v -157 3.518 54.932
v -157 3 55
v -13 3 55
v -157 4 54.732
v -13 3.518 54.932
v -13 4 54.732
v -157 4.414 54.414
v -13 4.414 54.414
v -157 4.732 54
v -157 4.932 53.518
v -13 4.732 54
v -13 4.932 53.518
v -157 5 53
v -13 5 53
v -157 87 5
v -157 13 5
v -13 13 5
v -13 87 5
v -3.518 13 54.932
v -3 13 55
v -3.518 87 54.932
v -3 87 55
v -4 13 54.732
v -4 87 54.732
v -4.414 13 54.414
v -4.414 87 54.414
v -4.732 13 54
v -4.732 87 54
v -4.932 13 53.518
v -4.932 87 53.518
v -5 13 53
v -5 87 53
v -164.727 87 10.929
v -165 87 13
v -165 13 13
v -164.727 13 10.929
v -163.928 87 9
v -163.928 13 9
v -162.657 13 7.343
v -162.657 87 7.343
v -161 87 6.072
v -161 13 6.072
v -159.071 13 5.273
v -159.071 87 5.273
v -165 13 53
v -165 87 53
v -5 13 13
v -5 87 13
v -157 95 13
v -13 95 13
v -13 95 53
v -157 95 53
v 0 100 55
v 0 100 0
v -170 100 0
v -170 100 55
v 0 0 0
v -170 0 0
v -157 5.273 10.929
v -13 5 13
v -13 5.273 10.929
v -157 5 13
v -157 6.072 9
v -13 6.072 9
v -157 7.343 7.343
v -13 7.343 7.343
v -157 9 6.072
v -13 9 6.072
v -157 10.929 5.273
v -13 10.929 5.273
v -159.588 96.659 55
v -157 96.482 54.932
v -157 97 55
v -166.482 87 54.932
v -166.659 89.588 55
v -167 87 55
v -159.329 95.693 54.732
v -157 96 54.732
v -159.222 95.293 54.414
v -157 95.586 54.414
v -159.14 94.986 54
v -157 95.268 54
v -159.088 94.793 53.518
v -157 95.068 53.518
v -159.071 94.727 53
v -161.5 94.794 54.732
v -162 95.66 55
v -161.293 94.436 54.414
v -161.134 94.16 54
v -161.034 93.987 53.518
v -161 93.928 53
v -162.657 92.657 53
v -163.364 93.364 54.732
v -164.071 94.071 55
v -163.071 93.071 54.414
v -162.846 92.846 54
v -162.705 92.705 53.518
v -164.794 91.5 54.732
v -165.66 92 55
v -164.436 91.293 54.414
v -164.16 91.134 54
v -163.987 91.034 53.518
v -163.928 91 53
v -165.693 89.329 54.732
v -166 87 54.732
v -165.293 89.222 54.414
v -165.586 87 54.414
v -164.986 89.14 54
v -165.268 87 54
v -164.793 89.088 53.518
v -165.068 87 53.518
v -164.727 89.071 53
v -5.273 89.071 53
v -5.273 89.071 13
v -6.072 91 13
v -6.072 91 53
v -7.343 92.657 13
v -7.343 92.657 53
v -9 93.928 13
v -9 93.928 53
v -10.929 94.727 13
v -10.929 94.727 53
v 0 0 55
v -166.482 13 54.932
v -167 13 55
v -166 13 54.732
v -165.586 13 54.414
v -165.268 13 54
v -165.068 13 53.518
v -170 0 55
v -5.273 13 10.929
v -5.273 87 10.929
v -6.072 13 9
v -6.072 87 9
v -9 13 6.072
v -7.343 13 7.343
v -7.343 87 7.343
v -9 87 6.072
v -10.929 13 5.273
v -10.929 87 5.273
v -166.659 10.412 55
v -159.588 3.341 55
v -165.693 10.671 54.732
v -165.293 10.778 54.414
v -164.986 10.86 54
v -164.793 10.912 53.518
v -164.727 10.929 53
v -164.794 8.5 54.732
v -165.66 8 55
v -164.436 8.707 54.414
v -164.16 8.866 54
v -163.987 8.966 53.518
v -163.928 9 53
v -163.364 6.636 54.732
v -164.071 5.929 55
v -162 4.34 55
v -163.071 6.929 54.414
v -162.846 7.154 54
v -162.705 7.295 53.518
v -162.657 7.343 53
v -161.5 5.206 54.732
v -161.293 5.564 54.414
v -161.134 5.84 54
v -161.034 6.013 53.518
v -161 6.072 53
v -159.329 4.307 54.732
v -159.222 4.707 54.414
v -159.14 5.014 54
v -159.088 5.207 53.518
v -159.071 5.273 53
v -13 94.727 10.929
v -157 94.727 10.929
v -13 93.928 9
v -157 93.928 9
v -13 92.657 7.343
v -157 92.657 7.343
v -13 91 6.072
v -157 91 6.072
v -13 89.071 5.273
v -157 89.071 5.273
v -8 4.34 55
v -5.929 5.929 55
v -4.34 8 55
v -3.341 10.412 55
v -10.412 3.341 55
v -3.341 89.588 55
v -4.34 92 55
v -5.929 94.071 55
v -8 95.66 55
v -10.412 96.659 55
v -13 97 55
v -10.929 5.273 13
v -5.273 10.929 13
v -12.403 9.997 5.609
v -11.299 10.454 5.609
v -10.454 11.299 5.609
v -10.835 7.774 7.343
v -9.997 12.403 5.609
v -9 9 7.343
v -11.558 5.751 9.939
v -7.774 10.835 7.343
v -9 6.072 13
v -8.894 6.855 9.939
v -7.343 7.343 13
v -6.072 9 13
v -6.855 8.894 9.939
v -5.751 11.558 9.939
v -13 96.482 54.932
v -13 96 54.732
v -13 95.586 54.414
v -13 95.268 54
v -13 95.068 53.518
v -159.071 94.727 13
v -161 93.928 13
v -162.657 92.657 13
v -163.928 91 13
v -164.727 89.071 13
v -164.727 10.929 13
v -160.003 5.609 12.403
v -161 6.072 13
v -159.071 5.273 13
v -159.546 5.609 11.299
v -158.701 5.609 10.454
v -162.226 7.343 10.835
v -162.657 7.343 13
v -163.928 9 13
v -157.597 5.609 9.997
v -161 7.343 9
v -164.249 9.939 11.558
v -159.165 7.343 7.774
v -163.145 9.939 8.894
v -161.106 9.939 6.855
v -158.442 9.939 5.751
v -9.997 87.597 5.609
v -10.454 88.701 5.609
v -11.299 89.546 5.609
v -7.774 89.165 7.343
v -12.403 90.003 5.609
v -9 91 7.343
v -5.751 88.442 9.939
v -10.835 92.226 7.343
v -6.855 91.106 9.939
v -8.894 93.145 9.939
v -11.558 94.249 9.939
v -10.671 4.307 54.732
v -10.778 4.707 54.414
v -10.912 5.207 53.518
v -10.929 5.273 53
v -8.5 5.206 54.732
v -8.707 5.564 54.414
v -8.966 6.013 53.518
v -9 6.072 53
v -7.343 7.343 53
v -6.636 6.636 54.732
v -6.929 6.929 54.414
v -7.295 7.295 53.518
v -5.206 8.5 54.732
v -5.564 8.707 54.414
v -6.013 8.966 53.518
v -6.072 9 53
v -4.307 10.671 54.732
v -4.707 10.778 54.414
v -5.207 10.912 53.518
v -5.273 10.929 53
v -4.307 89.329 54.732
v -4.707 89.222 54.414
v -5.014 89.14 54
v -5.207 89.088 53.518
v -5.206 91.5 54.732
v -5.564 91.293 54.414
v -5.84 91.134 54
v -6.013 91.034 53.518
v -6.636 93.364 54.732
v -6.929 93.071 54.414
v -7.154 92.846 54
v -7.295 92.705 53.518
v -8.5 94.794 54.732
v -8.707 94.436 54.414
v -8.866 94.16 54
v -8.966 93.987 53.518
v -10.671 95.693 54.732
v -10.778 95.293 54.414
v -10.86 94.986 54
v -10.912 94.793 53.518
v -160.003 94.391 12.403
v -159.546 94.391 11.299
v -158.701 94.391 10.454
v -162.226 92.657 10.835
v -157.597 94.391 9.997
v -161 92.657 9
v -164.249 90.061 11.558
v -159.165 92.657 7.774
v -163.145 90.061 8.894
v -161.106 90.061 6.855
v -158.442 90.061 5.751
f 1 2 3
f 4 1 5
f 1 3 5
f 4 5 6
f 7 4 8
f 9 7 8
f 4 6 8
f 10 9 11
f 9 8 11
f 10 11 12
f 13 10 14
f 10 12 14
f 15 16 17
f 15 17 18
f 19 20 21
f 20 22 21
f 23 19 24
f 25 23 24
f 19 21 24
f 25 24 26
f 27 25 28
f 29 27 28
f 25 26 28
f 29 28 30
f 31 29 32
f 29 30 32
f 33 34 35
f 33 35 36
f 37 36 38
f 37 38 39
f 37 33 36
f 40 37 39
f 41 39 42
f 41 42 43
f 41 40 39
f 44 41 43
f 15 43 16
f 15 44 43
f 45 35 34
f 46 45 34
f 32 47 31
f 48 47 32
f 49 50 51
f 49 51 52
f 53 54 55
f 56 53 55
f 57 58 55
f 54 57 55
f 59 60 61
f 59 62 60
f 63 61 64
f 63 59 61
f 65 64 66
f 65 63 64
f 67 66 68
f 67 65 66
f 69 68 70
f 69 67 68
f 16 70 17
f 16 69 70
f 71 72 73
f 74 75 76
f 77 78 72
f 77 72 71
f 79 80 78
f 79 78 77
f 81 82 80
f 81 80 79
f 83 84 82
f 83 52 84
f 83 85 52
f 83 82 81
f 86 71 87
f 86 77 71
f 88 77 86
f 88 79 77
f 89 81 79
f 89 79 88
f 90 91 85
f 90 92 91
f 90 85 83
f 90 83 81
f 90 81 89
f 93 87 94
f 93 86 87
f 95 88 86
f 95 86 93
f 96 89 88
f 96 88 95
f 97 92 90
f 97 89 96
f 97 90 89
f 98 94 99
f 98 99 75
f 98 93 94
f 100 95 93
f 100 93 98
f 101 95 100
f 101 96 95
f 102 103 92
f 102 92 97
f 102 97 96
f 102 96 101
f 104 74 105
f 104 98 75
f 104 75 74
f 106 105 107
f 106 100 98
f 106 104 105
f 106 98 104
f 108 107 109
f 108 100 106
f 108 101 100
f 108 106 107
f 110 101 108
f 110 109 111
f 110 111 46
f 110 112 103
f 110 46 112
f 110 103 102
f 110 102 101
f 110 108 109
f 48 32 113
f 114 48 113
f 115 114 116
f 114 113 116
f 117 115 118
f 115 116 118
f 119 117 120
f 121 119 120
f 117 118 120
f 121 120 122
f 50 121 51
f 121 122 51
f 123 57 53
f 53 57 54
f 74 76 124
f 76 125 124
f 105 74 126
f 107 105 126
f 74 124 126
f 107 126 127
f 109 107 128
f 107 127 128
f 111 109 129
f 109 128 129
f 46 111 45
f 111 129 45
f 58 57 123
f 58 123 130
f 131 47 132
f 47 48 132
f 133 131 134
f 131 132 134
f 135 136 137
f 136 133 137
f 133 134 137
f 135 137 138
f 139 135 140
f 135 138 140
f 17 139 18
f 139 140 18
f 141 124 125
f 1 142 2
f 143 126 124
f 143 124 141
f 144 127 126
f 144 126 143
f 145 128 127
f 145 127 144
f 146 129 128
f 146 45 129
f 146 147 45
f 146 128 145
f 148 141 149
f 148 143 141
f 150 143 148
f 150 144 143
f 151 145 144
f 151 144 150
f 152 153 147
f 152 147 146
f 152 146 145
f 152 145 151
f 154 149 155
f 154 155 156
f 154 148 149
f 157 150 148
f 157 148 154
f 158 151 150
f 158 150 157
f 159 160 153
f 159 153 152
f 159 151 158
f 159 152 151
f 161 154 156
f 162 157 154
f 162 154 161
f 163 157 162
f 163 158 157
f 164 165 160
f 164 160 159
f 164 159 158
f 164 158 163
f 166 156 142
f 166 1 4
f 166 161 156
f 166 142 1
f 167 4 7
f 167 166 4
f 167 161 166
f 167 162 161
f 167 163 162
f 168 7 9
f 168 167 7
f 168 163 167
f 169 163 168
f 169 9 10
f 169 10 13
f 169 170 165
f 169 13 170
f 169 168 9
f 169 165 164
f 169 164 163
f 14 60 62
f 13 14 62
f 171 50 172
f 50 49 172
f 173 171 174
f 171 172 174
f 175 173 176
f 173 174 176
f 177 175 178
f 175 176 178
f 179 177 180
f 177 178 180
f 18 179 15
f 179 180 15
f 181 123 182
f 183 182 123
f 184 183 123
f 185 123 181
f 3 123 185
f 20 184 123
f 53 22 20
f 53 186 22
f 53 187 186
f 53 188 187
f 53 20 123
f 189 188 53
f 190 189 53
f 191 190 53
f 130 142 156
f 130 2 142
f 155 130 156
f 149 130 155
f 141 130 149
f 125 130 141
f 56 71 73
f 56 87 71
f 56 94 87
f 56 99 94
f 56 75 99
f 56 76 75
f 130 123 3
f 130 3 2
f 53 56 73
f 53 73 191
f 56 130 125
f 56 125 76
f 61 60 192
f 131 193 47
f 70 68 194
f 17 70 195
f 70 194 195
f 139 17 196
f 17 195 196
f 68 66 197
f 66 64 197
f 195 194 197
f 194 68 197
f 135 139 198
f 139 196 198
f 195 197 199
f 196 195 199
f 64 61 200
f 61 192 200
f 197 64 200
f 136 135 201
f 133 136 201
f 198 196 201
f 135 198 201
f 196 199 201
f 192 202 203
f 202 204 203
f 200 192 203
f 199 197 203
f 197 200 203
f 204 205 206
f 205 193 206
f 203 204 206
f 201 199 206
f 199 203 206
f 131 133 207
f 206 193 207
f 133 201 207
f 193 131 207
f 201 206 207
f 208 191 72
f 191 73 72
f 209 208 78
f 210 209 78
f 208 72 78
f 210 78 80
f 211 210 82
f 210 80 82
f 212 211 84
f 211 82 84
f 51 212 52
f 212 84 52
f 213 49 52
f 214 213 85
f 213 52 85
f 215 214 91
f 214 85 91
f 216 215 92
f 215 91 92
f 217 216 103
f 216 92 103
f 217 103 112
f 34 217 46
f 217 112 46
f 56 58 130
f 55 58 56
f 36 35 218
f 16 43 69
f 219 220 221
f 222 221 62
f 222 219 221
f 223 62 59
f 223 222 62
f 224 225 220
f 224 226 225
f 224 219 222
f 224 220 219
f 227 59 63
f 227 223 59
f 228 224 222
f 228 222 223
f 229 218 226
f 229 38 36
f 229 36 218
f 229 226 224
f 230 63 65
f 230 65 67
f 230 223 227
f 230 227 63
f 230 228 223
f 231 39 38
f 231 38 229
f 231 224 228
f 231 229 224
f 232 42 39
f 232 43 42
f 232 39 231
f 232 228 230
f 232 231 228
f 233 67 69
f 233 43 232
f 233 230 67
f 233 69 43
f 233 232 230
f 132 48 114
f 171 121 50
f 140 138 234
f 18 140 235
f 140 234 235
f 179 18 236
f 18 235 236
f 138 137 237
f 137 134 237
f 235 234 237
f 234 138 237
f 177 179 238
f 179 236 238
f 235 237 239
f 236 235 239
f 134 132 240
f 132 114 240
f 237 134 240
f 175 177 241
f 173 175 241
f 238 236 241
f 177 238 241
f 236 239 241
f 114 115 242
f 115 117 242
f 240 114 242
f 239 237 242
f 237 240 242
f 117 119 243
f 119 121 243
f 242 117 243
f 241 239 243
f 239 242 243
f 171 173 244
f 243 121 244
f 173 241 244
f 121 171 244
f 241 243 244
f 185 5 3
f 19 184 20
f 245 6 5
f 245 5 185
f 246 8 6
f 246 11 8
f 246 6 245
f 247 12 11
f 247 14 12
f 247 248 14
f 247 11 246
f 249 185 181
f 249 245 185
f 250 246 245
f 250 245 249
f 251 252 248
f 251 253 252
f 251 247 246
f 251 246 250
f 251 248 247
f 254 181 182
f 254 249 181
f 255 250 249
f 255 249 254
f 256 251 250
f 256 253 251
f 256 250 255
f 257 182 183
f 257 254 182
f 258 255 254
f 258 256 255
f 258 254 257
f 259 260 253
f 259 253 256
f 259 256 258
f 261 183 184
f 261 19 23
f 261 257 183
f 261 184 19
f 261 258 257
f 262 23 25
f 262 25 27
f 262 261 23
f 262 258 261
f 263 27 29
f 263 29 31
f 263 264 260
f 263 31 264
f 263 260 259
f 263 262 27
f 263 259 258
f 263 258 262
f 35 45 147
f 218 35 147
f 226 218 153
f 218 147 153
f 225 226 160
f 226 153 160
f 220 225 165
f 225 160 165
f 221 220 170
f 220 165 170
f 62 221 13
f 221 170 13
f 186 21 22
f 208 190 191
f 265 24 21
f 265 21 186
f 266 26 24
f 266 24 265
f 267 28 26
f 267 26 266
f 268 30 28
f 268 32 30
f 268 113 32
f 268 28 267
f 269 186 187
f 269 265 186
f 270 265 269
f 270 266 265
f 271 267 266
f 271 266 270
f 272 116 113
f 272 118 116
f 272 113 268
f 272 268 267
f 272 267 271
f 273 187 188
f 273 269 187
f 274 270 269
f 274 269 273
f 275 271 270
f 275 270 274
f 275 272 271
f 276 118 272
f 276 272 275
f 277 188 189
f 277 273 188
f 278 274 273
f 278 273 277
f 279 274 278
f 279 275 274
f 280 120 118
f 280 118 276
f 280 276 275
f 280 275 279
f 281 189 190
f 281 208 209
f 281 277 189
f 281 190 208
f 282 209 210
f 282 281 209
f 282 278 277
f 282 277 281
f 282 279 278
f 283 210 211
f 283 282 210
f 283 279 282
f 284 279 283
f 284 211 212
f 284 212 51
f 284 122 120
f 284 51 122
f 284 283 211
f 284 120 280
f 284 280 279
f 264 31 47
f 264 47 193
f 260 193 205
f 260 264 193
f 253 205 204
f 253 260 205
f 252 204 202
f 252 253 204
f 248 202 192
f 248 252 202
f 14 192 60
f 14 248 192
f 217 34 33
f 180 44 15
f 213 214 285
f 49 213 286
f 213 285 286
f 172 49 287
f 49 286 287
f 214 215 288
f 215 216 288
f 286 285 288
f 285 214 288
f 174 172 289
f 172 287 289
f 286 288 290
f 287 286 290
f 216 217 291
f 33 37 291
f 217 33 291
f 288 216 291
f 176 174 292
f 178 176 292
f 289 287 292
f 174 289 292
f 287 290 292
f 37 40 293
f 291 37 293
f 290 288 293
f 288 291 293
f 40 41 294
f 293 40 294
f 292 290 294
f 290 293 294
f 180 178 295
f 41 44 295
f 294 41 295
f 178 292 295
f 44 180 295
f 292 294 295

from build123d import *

# Parameters (mm, degrees)
IZIM1_W                     = 90
IZIM1_H                     = 160
Y_KSEKLIK_EKSTR_ZYON1_DEPTH = 5
IZIM1_3_W                   = 100
IZIM1_3_H                   = 170
IZIM1_3_W_2                 = 90
IZIM1_3_H_2                 = 160
Y_KSEKLIK_EKSTR_ZYON2_DEPTH = 55
RADYUS1_R                   = 8
RADYUS2_R                   = 2


with BuildPart() as part:
    # Çizim1 → Yükseklik-Ekstrüzyon1 (new body)
    with BuildSketch(Plane(origin=(0, 0, 0), x_dir=(0, 1, 0), z_dir=(0, 0, 1))):
        with Locations((50, 85)):
            Rectangle(IZIM1_W, IZIM1_H)
    extrude(amount=Y_KSEKLIK_EKSTR_ZYON1_DEPTH)

    # Çizim1<3> → Yükseklik-Ekstrüzyon2 (add)
    with BuildSketch(Plane(origin=(0, 0, 0), x_dir=(0, 1, 0), z_dir=(0, 0, 1))):
        with Locations((50, 85)):
            Rectangle(IZIM1_3_W, IZIM1_3_H)
        with Locations((50, 85)):
            Rectangle(IZIM1_3_W_2, IZIM1_3_H_2, mode=Mode.SUBTRACT)
    extrude(amount=Y_KSEKLIK_EKSTR_ZYON2_DEPTH)

    # Radyus1
    radyus1_edges = [part.edges().sort_by_distance(p)[0] for p in [
        (-165, 50, 5),
        (-5, 95, 30),
        (-165, 95, 30),
        (-165, 5, 30),
        (-5, 5, 30),
        (-85, 5, 5),
        (-5, 50, 5),
        (-85, 95, 5),
    ]]
    fillet(radyus1_edges, radius=RADYUS1_R)

    # Radyus2
    radyus2_edges = [part.edges().sort_by_distance(p)[0] for p in [
        (-5, 50, 55),
        (-85, 95, 55),
        (-85, 5, 55),
        (-165, 50, 55),
        (-7.343145751, 92.656854249, 55),
        (-7.343145751, 7.343145751, 55),
        (-162.656854249, 92.656854249, 55),
        (-162.656854249, 7.343145751, 55),
    ]]
    fillet(radyus2_edges, radius=RADYUS2_R)


solid = part.part
